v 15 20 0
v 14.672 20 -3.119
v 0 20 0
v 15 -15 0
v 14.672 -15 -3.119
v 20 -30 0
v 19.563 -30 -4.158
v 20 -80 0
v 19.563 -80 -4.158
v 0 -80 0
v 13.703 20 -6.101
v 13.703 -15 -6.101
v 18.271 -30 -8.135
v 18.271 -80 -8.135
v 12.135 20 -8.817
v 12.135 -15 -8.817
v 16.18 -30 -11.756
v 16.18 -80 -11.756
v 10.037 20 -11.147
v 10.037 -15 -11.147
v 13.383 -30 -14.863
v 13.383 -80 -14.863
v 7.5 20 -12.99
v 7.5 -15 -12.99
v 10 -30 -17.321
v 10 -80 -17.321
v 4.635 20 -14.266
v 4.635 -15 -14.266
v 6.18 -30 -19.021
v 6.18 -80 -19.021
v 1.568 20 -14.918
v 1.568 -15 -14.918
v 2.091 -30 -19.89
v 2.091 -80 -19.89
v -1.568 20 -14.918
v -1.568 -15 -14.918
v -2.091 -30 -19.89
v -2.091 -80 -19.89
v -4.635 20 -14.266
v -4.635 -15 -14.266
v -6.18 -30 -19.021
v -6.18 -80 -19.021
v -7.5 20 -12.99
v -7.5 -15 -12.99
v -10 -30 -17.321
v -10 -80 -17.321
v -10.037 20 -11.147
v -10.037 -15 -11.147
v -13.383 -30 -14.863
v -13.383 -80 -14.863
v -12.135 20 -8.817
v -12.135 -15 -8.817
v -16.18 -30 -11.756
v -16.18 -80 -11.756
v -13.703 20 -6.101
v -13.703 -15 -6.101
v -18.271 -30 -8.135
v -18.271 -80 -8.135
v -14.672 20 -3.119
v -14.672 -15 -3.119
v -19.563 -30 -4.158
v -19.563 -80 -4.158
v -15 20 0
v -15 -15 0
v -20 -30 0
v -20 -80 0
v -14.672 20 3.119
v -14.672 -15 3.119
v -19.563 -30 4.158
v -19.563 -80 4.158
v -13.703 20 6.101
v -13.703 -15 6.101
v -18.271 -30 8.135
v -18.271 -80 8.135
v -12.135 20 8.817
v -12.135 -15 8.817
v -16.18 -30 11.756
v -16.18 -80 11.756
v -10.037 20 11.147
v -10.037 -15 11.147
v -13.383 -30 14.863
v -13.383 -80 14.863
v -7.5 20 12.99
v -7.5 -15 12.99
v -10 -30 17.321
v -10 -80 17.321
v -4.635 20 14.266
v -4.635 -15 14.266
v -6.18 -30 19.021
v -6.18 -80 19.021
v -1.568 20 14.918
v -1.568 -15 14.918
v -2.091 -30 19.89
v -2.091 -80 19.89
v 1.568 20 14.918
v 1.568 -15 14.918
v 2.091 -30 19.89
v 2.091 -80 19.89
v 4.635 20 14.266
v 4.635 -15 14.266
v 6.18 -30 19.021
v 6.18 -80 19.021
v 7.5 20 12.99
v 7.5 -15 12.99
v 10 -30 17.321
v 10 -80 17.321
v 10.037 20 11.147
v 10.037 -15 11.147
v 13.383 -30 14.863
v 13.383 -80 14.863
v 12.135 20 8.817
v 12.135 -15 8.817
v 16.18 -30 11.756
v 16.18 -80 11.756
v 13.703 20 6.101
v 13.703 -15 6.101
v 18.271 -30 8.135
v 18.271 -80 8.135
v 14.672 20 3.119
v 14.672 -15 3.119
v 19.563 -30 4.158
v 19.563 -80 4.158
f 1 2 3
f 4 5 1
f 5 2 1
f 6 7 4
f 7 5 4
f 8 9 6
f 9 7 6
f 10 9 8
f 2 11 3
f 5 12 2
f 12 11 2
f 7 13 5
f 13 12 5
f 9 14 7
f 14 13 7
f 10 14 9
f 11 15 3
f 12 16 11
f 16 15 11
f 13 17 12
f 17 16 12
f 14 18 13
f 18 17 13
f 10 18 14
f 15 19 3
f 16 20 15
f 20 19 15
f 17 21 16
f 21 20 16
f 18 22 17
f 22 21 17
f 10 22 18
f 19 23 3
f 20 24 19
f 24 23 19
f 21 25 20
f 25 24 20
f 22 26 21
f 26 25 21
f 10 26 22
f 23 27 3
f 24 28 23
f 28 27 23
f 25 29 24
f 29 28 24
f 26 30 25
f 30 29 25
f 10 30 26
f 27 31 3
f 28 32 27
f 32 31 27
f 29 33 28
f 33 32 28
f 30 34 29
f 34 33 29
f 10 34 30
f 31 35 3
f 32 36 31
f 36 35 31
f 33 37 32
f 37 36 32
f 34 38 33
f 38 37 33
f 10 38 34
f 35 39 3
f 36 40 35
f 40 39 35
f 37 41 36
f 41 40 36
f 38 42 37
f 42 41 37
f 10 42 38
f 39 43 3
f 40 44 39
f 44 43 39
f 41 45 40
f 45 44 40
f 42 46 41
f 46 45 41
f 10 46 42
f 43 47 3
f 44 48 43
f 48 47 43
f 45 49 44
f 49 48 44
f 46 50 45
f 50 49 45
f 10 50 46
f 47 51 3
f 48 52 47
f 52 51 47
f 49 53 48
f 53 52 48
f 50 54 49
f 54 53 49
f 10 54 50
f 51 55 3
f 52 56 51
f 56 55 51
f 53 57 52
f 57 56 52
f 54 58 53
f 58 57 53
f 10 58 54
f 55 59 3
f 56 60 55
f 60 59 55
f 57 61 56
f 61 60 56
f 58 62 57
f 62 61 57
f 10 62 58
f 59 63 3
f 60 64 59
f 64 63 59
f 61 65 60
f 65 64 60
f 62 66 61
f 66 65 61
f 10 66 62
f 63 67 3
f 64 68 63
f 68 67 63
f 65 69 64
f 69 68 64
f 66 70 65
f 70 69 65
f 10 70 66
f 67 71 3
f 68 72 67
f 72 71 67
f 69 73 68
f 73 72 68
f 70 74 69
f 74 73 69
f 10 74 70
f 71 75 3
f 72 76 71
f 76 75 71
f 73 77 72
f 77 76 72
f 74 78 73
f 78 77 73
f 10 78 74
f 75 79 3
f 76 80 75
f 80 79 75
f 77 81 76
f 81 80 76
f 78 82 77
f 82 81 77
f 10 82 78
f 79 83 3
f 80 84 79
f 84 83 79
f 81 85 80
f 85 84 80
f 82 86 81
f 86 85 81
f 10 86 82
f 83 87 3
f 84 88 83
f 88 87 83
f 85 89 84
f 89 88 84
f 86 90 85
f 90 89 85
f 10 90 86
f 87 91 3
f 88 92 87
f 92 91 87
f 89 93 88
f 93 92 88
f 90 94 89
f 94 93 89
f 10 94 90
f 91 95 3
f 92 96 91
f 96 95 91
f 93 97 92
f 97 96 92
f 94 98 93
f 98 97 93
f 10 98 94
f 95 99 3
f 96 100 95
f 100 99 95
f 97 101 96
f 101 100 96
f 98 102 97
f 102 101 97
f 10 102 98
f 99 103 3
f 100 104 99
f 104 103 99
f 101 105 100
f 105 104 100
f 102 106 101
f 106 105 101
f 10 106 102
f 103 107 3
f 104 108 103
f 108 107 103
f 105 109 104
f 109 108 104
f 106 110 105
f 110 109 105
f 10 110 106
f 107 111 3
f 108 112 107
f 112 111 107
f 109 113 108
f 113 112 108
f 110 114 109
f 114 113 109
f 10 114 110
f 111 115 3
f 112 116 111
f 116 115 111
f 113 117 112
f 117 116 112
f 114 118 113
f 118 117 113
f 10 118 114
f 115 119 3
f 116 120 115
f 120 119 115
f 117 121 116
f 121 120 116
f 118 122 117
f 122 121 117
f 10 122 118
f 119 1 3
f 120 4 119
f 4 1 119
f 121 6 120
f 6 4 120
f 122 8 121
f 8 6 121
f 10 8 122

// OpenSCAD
module Shaft_01(){
    color("gray")
    // translate([-1,0,-1])
    
    rotate([90,0,0])
    rotate_extrude(angle = 360)
    rotate([0,0,90])

    polygon(points=[[-20,0],[80,0],[80,20],[30,20],[15,15],[-20,15]]);

}
 

Shaft_01();
